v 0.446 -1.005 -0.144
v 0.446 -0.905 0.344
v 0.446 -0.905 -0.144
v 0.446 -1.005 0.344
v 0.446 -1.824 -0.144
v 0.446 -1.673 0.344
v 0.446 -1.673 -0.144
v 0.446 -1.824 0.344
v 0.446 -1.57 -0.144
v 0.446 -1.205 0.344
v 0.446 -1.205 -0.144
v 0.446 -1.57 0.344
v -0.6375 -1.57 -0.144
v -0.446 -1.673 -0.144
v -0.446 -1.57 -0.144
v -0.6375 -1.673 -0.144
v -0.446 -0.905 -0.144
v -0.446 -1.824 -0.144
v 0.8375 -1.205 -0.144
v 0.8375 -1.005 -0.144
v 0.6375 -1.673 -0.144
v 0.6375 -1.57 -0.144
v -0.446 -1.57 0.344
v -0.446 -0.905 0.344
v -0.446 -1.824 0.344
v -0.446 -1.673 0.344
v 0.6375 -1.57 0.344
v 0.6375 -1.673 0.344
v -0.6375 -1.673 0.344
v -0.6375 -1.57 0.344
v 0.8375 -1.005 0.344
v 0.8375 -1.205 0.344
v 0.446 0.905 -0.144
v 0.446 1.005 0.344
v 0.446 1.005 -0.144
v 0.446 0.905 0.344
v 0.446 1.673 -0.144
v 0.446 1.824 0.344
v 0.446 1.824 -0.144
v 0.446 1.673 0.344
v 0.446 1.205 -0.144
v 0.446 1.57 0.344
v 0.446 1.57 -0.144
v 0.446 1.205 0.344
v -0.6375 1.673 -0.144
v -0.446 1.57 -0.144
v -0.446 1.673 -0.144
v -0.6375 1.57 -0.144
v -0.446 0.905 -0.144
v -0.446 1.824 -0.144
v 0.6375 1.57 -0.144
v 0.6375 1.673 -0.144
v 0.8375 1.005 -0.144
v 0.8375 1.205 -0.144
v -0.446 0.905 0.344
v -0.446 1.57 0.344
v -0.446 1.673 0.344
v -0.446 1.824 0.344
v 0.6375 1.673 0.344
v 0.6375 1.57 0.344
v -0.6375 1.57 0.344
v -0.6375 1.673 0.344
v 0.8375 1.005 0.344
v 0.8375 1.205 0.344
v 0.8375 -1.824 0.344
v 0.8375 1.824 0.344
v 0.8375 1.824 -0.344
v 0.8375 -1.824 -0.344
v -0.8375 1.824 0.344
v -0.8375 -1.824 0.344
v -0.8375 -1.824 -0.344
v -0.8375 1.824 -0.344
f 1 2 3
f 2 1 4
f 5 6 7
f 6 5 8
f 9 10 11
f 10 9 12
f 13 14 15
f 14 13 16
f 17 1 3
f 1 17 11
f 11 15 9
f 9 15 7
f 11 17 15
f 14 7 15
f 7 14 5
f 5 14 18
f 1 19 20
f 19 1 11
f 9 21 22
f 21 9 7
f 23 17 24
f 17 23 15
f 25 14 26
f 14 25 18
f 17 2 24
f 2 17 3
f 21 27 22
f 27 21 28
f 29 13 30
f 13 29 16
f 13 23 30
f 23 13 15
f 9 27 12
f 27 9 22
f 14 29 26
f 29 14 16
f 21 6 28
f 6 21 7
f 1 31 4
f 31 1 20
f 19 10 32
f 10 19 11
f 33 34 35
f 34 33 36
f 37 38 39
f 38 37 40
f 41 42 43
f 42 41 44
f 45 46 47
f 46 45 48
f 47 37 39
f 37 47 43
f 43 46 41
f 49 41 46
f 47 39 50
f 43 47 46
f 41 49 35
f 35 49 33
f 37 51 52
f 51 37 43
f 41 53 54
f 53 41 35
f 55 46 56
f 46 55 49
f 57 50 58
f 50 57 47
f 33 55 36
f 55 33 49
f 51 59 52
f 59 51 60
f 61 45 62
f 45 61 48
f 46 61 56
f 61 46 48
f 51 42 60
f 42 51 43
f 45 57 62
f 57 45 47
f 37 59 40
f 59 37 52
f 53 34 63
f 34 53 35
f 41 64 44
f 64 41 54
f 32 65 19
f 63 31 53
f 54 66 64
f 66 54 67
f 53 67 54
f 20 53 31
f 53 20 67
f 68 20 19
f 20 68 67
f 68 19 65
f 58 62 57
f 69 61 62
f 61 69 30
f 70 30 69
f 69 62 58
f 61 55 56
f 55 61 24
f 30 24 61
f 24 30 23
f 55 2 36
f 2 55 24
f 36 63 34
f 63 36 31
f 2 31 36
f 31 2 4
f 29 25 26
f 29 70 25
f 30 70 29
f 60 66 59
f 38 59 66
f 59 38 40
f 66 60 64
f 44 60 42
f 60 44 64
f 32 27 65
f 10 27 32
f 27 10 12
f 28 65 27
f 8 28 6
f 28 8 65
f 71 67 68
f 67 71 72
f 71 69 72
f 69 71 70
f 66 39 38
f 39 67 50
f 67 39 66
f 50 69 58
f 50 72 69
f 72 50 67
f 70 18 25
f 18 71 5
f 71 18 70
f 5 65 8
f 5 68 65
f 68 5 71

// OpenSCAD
$fa = 1;
$fs = 0.01;

t = 0.005;
w = 0.4;

//MOTOR
mx = 0.887 + t;
my = 0.919 + t;
mz = 0.488 + t;
//fins
mfinx = 1.270 + t;
mfiny = 0.098 + t;
mfinOffset = 0.665;
//wheel mount
mmounty = 0.171 + t;
mmountCircum = mz;
//wire tunnel
mtunnelx = 1.5;
mtunnely = 0.2;
mtunnelOffset = 0.1;

module MotorNegSpace() {
    cube([mx, my, mz], center = true);
    translate([0, -(mfinOffset - my/2 + mfiny/2), 0])
        cube([mfinx, mfiny, mz], center = true);
    translate([(mx/2 - mmountCircum/2), -(mmounty/2 + my/2 - t), 0])
        rotate([90, 0, 0])
        cylinder(h = mmounty, r = mmountCircum/2, center = true);
    translate([(mtunnelx/2 - mx/2), -(-my/2 + mtunnely/2 + mtunnelOffset), 0])
        cube([mtunnelx, mtunnely, mz], center = true);
}
//BREADBOARD

//BATTERY
bx = 0;
by = 1;
bz = 0;

module BatteryNegSpace() {
}
//SENSOR

//BALL BEARING

//WHEEL

//ASSEMBLY
ax = mfinx + w;
ay = by + w + my*2 + w;
az = mz + w/2 - t;

difference() {
    cube([ax, ay, az], center = true);
    translate([0, -(ay/2 - my/2 + t), (az/2 - mz/2 + t)])
        MotorNegSpace();
    translate([0, (ay/2 - my/2 + t), (az/2 - mz/2 + t)])
        rotate([180, 0, 0])
        MotorNegSpace();

}
